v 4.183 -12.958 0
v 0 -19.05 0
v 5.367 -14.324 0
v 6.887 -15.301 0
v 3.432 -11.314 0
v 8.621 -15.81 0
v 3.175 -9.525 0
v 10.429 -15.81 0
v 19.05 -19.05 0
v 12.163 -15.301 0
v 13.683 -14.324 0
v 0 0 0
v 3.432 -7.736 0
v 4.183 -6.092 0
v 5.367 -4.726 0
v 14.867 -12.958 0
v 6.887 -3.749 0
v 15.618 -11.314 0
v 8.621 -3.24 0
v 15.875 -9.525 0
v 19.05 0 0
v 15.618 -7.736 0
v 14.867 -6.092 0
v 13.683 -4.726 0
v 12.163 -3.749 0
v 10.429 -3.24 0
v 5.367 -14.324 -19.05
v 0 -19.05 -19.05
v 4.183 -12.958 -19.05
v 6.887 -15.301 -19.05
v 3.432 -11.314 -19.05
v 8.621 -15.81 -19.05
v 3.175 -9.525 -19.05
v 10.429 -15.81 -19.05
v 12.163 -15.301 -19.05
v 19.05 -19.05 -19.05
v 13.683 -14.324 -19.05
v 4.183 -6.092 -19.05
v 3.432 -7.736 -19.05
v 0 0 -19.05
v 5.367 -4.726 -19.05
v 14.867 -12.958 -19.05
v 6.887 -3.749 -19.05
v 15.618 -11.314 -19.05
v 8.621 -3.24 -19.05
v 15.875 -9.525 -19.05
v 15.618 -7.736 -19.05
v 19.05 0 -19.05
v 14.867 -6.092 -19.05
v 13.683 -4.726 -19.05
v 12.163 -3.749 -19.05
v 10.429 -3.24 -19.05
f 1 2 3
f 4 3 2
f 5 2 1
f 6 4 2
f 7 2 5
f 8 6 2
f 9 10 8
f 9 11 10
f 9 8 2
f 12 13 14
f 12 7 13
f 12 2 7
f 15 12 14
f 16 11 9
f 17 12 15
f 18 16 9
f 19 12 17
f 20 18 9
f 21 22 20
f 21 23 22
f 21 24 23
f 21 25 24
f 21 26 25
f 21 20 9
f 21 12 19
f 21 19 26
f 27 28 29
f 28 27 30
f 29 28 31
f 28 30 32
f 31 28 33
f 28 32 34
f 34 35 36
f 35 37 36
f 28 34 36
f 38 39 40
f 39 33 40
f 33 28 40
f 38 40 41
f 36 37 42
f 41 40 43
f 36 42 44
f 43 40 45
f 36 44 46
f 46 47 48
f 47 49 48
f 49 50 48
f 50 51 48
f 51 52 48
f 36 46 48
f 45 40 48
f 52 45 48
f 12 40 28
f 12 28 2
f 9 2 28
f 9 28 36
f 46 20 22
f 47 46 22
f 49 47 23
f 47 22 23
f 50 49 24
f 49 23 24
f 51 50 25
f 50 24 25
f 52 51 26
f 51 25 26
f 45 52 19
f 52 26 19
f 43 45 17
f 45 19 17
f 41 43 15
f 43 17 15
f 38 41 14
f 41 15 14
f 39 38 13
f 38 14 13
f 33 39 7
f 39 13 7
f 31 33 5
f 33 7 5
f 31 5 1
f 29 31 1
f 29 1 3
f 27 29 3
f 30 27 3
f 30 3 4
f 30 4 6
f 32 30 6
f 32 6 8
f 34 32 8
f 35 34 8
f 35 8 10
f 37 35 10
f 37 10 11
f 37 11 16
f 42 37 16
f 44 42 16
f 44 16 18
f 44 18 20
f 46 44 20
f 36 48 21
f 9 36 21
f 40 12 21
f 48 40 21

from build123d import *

# Parameters (mm, degrees)
F0_W     = 19.05
F0_H     = 19.05
F1_DEPTH = 19.05
F2_R     = 6.35
F3_DEPTH = 25.4


with BuildPart() as f1:
    # F0 (on Front) → F1 (new body)
    with BuildSketch(Plane.XZ):
        with Locations((9.525, -9.525)):
            Rectangle(F0_W, F0_H)
    extrude(amount=F1_DEPTH)

    # F2 (on face) → F3 (cut)
    with BuildSketch(Plane.XY):
        with Locations((9.525, -9.525)):
            Circle(F2_R)
    extrude(amount=-F3_DEPTH, mode=Mode.SUBTRACT)


solid = f1.part
